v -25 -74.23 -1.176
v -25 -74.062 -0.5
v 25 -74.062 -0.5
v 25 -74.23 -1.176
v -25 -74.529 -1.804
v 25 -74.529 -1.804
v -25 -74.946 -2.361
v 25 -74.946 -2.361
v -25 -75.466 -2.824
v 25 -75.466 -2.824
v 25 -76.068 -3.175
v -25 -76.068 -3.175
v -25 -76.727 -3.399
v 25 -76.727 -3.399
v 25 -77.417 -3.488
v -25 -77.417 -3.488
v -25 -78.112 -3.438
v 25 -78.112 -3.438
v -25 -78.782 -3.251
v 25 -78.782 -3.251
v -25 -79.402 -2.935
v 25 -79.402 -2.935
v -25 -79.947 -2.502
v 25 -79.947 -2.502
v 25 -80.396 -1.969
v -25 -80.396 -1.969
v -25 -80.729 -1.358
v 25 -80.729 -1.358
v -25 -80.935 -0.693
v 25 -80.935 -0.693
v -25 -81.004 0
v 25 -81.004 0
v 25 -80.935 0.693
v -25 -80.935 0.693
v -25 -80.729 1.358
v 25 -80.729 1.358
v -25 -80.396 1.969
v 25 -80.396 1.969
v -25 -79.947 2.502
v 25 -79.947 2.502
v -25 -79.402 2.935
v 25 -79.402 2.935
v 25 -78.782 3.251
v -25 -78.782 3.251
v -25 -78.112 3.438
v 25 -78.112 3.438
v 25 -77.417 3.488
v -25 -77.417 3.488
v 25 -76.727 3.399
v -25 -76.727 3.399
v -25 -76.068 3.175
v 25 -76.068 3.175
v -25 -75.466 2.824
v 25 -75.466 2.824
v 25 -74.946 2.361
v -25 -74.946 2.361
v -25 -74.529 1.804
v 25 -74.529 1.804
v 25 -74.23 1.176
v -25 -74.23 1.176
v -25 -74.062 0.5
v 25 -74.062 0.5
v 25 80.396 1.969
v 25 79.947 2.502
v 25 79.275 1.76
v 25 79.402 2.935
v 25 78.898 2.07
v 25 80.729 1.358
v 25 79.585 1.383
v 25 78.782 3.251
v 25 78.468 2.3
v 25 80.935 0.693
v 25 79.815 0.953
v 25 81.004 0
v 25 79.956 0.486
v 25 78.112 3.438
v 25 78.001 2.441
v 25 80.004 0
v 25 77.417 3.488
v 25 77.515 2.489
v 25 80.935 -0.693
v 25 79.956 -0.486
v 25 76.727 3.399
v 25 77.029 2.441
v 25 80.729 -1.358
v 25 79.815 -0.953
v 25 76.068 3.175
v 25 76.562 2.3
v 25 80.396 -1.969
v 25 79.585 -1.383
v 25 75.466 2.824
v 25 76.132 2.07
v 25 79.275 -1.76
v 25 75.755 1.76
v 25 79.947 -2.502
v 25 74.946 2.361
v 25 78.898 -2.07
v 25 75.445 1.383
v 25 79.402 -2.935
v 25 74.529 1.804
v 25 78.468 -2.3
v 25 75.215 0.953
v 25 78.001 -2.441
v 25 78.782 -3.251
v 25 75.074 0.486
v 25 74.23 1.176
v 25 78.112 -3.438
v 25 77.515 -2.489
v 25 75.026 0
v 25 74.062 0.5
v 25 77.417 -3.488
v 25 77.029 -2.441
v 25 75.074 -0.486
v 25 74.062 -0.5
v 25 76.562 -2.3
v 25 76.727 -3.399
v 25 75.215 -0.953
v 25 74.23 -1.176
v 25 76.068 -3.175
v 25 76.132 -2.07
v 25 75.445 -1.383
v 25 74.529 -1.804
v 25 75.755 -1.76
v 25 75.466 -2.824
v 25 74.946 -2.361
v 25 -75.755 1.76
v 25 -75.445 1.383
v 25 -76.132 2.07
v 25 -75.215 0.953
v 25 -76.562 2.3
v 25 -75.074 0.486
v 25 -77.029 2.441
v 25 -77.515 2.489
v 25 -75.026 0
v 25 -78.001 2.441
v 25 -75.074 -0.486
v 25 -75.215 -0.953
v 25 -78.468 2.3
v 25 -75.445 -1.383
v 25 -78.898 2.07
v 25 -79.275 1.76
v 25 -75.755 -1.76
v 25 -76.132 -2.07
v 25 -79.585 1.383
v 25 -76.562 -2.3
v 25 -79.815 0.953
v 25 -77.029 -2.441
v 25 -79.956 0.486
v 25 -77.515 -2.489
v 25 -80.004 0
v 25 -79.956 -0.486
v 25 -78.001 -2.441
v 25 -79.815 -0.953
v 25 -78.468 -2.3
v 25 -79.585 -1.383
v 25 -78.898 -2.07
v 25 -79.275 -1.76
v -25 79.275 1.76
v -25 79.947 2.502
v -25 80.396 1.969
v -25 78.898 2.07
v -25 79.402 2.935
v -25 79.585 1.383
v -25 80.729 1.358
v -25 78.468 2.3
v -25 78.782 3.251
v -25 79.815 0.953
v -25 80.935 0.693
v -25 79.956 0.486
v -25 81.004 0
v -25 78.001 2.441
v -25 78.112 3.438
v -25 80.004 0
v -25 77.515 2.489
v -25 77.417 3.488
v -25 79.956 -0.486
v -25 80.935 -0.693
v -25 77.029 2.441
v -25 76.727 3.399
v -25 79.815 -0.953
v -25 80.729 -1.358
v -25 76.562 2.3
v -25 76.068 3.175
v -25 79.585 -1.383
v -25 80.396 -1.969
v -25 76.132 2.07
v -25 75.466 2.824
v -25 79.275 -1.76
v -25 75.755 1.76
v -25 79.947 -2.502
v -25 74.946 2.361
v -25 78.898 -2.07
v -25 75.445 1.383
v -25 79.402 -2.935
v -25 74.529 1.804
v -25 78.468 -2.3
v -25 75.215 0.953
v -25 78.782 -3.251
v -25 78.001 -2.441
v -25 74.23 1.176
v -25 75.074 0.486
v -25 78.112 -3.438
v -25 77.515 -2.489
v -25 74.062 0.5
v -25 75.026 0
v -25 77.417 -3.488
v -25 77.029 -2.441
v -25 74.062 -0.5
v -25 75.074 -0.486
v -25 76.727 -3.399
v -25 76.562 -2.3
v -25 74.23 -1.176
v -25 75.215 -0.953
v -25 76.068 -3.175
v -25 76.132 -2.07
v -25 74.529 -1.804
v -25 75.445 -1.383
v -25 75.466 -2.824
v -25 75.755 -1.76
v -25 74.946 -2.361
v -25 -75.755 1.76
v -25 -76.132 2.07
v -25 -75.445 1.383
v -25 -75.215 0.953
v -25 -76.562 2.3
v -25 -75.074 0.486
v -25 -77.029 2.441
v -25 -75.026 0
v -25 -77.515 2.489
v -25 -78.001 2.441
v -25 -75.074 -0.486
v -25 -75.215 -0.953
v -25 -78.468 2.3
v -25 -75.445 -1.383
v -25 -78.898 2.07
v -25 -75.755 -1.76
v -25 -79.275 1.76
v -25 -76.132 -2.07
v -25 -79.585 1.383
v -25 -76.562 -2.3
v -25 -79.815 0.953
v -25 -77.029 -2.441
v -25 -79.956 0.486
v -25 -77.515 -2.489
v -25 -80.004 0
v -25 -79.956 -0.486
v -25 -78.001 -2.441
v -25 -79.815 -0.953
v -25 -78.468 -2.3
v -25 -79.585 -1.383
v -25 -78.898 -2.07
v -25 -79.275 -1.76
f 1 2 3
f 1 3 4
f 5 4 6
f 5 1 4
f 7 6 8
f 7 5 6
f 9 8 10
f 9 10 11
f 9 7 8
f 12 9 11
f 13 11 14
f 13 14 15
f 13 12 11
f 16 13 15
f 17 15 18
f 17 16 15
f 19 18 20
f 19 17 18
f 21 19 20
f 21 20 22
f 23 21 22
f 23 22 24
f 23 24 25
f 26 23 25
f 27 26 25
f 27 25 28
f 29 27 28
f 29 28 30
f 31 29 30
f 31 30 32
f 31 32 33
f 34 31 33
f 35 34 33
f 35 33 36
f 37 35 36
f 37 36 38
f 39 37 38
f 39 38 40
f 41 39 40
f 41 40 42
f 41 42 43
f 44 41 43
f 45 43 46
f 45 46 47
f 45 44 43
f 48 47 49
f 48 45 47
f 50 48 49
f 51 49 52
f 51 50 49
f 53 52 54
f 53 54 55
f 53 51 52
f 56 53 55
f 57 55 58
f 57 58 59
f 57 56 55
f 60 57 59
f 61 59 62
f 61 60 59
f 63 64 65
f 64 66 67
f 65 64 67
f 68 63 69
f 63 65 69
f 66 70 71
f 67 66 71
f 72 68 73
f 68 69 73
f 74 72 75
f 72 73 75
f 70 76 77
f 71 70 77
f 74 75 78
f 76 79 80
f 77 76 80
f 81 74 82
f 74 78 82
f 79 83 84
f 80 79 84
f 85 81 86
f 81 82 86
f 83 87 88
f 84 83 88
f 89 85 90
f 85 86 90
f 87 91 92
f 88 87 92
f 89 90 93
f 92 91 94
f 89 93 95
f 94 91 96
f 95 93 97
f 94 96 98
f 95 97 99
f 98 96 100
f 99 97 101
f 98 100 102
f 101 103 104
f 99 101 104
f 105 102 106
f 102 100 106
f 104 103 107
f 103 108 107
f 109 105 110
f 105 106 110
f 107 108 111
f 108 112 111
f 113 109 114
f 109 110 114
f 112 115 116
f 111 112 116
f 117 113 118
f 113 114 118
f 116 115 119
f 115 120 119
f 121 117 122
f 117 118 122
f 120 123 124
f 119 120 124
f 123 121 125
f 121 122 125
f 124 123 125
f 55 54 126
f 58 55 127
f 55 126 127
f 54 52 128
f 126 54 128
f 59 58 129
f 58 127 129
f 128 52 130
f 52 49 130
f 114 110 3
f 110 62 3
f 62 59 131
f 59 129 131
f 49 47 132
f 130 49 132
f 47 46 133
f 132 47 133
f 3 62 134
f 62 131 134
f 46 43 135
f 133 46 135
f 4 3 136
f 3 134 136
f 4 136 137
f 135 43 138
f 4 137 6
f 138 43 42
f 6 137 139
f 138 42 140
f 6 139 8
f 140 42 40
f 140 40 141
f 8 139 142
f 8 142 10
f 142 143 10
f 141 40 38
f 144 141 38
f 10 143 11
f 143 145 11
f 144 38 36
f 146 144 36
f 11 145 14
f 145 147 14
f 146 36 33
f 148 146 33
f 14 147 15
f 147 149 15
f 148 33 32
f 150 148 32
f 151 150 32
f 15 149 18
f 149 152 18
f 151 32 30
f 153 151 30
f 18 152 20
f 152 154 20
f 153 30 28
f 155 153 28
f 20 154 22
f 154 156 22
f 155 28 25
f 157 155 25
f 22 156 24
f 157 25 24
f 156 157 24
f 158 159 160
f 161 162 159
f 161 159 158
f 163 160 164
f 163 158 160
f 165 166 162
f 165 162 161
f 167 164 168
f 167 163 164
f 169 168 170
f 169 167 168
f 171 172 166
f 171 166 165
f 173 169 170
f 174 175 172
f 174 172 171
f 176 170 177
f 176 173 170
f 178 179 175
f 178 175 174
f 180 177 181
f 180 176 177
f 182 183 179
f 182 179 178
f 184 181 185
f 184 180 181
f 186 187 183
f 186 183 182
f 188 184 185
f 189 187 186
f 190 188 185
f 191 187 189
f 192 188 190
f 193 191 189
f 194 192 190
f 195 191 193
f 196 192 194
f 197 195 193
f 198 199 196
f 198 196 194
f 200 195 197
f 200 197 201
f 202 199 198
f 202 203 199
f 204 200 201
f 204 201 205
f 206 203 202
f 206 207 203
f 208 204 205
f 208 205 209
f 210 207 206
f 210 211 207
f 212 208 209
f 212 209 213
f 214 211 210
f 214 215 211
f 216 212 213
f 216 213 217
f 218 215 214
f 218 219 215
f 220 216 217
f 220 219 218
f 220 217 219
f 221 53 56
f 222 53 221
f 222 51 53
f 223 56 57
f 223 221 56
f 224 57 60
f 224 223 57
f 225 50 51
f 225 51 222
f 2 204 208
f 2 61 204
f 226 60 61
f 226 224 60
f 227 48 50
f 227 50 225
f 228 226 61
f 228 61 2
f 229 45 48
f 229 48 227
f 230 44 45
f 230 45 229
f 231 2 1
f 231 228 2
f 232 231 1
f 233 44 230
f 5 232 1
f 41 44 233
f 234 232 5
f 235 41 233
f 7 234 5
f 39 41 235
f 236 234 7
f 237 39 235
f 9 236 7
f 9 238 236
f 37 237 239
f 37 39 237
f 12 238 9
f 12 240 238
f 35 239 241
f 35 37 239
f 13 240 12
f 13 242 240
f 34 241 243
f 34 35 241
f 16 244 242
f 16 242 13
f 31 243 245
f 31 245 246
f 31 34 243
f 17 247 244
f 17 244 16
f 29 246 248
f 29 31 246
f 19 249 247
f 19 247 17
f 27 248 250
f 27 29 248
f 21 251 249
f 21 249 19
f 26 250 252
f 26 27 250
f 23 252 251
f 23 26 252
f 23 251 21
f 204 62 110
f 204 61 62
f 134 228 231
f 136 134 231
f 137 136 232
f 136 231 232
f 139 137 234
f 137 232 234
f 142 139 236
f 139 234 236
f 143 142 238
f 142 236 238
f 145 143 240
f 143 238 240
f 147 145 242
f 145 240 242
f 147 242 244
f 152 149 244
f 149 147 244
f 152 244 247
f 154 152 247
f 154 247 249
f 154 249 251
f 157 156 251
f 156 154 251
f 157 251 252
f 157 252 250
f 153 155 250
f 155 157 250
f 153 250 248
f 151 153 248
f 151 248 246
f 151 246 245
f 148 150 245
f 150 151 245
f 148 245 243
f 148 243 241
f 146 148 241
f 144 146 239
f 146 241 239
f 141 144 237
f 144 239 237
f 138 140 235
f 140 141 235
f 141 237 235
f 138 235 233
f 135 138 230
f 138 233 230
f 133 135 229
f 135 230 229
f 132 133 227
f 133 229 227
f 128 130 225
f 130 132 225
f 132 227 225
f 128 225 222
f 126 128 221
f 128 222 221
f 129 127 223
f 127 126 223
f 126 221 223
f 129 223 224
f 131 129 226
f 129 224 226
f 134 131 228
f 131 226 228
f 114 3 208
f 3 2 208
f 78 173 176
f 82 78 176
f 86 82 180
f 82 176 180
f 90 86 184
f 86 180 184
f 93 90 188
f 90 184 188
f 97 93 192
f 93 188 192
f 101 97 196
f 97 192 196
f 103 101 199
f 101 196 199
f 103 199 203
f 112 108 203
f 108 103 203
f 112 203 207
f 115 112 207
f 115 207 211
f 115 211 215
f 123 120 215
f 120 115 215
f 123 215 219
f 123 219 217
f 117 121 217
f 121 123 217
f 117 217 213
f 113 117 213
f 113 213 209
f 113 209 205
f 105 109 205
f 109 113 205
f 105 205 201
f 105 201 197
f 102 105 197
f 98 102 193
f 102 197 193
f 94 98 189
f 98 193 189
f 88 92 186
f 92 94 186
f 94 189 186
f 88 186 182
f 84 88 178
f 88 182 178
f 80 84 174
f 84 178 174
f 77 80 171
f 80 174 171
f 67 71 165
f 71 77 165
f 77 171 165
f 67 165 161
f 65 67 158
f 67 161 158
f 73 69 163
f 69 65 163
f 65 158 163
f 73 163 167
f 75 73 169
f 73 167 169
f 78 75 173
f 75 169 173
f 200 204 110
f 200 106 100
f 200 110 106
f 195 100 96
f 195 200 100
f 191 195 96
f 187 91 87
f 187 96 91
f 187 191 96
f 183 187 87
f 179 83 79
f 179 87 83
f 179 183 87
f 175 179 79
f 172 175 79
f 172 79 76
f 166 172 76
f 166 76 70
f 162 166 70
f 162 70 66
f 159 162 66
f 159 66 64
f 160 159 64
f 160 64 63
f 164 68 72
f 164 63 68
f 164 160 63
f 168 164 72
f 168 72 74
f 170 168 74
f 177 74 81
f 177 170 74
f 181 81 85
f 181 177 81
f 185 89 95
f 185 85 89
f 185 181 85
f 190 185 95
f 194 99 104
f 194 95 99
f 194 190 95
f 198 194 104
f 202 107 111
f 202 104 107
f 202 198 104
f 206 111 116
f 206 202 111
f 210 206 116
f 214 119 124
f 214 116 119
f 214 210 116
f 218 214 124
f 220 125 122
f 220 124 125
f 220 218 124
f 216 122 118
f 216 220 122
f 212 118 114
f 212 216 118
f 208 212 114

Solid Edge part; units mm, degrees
sketch "Sketch1" plane through (0, 0, 0) normal (1, 0, 0) x (0, 1, 0)
  circle A0 centre (-77.515, 0) radius 2.4892
  arc A1 (-74.0618, -0.5) -> (-74.0618, 0.5) centre (-77.515, 0) cw
  line L0 (-74.0618, -0.5) -> (74.0618, -0.5)
  arc A2 (74.0618, -0.5) -> (74.0618, 0.5) centre (77.515, 0) ccw
  line L1 (-74.0618, 0.5) -> (74.0618, 0.5)
  circle A3 centre (77.515, 0) radius 2.4892
extrude "Protrusion1" add sketch "Sketch1" along normal mid plane 50
properties material "Nylon, general purpose"
